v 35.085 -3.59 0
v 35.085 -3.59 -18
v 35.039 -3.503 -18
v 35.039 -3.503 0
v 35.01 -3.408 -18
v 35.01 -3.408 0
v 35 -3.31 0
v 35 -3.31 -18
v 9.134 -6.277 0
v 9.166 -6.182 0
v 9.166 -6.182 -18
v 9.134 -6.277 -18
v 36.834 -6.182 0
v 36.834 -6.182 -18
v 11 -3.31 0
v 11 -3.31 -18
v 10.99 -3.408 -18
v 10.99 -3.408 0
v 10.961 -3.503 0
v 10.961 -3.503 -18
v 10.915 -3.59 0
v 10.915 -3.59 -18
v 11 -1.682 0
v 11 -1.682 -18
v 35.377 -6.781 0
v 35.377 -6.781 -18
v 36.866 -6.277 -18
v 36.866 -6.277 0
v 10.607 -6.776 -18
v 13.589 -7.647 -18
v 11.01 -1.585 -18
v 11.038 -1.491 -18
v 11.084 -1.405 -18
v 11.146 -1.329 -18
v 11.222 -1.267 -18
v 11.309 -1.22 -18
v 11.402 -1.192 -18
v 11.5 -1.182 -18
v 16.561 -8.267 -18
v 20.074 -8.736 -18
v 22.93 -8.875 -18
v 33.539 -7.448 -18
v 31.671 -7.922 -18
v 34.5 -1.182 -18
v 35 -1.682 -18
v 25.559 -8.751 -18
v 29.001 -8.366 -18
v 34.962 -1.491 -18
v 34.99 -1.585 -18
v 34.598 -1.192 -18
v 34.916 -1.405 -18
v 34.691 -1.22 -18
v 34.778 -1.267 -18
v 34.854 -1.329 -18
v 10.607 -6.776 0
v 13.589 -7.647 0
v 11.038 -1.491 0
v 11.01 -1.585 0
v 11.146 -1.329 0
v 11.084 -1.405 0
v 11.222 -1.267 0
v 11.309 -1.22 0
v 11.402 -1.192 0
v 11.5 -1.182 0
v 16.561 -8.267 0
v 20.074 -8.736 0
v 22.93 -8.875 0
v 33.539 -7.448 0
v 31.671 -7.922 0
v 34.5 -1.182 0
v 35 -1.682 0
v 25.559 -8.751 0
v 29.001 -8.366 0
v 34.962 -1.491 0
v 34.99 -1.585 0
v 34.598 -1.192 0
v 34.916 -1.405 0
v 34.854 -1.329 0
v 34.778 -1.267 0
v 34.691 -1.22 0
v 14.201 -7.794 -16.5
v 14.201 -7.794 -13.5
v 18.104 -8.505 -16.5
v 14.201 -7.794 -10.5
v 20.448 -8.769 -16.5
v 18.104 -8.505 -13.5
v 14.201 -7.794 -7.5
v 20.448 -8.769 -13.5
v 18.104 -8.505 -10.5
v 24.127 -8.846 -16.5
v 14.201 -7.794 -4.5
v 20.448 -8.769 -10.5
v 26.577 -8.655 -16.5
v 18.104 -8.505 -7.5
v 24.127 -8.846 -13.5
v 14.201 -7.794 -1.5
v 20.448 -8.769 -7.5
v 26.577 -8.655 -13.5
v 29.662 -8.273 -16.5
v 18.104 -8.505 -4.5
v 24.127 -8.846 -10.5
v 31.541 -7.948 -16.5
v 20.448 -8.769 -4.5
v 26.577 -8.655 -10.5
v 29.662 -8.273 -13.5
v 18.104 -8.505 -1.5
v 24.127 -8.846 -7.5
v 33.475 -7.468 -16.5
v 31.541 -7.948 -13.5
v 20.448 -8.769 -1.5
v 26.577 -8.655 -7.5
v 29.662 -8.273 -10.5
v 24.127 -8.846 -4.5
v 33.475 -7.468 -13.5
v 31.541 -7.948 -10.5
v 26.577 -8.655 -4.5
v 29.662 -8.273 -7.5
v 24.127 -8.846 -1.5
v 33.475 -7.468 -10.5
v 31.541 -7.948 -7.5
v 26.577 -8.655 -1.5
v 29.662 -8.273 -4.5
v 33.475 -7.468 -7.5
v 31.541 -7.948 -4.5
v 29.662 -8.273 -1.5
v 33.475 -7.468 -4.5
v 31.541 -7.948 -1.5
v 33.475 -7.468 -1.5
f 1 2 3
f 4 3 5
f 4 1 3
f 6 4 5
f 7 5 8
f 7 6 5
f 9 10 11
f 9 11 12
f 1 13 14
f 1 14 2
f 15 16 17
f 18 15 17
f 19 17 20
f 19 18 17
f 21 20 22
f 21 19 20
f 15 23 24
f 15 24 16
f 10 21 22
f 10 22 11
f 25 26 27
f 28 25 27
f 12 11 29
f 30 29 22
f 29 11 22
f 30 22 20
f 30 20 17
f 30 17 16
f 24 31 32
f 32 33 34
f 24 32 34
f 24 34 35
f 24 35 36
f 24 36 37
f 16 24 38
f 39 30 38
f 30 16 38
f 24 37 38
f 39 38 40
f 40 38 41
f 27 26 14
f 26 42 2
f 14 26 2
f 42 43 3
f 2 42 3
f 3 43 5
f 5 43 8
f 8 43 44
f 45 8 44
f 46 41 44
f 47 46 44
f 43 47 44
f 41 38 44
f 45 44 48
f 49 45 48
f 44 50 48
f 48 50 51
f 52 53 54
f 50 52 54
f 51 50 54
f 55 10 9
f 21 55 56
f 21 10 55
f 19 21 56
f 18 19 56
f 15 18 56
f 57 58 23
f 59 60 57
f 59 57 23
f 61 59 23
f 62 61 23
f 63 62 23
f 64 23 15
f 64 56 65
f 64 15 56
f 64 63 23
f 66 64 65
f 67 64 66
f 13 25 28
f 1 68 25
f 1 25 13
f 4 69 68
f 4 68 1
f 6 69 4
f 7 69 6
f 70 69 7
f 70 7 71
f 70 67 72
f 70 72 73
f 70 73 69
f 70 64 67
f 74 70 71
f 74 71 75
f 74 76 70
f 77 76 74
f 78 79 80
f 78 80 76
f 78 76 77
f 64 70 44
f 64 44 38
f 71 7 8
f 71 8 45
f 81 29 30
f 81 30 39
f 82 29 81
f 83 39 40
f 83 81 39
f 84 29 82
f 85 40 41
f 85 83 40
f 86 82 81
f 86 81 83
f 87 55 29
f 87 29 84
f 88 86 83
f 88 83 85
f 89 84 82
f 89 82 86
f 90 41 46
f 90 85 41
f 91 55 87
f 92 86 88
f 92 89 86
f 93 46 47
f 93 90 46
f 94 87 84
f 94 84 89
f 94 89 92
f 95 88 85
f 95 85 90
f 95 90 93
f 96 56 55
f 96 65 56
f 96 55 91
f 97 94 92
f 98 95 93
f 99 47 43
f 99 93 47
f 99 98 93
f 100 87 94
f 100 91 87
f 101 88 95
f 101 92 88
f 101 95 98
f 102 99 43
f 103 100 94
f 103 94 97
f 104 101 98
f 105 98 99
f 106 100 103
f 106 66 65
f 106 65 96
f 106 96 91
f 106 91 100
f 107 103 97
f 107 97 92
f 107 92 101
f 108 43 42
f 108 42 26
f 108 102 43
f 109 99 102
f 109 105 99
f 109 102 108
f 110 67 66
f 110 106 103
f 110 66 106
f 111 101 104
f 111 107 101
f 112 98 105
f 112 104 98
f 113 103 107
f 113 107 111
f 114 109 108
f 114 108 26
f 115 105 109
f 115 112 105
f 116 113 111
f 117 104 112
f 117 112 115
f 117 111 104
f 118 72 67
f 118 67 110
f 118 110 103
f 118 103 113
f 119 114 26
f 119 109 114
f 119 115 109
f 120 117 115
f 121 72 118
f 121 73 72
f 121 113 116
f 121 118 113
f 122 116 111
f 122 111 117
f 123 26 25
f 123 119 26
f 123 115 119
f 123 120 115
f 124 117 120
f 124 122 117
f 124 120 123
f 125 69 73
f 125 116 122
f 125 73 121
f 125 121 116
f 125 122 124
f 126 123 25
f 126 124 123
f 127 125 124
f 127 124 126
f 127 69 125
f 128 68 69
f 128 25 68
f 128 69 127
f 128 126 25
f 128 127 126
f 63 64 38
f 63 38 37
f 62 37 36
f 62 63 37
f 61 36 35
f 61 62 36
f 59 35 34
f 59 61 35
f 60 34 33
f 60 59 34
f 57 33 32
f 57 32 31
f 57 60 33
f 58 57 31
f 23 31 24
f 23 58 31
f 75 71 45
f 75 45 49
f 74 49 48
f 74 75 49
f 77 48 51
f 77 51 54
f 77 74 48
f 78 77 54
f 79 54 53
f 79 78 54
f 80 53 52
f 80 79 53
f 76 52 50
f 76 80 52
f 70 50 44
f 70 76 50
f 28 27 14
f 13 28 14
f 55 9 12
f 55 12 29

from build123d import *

# Parameters (mm, degrees)
BOSS_EXTRUDE1_DEPTH = 18


with BuildPart() as part:
    # Sketch1 → Boss-Extrude1 (new body)
    with BuildSketch(Plane.XY):
        with BuildLine():
            Line((35.376892046, -6.781044394), (36.866346672, -6.277070186))
            Line((36.866346672, -6.277070186), (36.834295551, -6.182345714))
            Line((36.834295551, -6.182345714), (35.085481214, -3.589621837))
            ThreePointArc((35.085481214, -3.589621837), (35.021847622, -3.456211238), (35, -3.310025385))
            Line((35, -3.310025385), (35, -1.682345714))
            ThreePointArc((35, -1.682345714), (34.853553391, -1.328792323), (34.5, -1.182345714))
            Line((34.5, -1.182345714), (11.5, -1.182345714))
            ThreePointArc((11.5, -1.182345714), (11.146446609, -1.328792323), (11, -1.682345714))
            Line((11, -1.682345714), (11, -3.310025385))
            ThreePointArc((11, -3.310025385), (10.978152378, -3.456211238), (10.914518786, -3.589621837))
            Line((10.914518786, -3.589621837), (9.165704449, -6.182345714))
            Line((9.165704449, -6.182345714), (9.133653328, -6.277070186))
            Line((9.133653328, -6.277070186), (10.607058659, -6.77561393))
            add(Edge.make_bspline(
                [(10.607058659, -6.77561393), (11.816063951, -7.18469486), (13.628034684, -7.692085525), (16.113891162, -8.202802822), (18.189551086, -8.532681309), (20.512287403, -8.80284347), (22.525873147, -8.895511296), (24.157727683, -8.851859587), (25.351258415, -8.774619539), (26.610405964, -8.65564999), (28.052887591, -8.489315058), (29.715436425, -8.277918045), (32.229421821, -7.855388776), (34.119164741, -7.321218718), (35.376892046, -6.781044394)],
                knots=[0, 0, 0, 0, 0.14631509, 0.222398937, 0.304823105, 0.398352424, 0.499675853, 0.544569926, 0.593205172, 0.641840418, 0.694528601, 0.764759844, 0.840843691, 1, 1, 1, 1], degree=3, weights=[1, 1, 1, 1, 1, 1, 1, 1, 1, 1, 1, 1, 1, 1, 1]))
        make_face()
    extrude(amount=-BOSS_EXTRUDE1_DEPTH)


solid = part.part
